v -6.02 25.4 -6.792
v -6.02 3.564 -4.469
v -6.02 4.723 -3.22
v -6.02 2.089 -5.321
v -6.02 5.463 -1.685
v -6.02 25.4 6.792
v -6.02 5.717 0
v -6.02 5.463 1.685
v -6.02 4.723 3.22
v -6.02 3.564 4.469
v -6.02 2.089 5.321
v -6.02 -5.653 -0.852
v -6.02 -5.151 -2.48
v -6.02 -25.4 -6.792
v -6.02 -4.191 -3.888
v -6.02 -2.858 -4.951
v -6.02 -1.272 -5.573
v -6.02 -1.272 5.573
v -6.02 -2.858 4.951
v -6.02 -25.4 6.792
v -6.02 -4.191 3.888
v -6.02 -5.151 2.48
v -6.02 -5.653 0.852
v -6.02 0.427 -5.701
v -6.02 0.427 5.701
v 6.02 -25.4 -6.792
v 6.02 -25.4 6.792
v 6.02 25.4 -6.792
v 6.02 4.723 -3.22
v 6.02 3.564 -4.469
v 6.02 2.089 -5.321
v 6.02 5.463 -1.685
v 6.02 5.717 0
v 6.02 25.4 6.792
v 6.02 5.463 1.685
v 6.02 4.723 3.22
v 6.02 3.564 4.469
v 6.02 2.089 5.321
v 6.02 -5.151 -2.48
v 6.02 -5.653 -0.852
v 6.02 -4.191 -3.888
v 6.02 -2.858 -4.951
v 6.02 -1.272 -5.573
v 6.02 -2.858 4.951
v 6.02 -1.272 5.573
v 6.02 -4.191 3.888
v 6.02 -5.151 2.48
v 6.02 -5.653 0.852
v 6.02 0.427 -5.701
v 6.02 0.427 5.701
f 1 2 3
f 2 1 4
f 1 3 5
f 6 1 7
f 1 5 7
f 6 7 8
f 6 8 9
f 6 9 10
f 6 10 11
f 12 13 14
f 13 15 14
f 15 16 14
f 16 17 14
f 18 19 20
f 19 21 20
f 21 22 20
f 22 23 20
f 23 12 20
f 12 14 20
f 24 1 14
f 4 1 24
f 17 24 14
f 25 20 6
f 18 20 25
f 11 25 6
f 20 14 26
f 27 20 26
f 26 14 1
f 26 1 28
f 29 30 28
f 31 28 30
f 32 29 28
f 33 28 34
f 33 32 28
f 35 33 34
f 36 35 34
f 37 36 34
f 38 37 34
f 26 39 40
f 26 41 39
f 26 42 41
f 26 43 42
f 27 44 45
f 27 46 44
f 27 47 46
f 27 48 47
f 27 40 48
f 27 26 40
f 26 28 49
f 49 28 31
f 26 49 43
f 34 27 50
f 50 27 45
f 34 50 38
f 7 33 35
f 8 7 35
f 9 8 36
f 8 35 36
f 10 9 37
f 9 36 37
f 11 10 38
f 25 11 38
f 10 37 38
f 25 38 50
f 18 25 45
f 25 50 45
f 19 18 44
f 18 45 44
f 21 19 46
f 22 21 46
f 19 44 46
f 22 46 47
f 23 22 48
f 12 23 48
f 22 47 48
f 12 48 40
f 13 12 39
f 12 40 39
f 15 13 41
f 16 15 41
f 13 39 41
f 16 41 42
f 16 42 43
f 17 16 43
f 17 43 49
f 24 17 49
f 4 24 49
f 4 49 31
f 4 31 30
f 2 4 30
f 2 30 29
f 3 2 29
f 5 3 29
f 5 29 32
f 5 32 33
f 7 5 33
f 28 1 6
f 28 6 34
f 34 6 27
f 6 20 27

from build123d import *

# Parameters (mm, degrees)
F0_W          = 12.03933
F0_H          = 13.584534
F1_DEPTH      = 25.4
F1_DEPTH_BACK = 25.4
F2_R          = 5.716631
F3_DEPTH      = 25.4


with BuildPart() as f1:
    # F0 (on Front) → F1 (new body, two sides)
    with BuildSketch(Plane.XZ) as f1_sk:
        Rectangle(F0_W, F0_H)
    extrude(amount=F1_DEPTH)
    extrude(f1_sk.sketch, amount=-F1_DEPTH_BACK)

    # F2 (on face) → F3 (cut)
    with BuildSketch(Plane.YZ.offset(6.019665)):
        Circle(F2_R)
    extrude(amount=-F3_DEPTH, mode=Mode.SUBTRACT)


solid = f1.part
